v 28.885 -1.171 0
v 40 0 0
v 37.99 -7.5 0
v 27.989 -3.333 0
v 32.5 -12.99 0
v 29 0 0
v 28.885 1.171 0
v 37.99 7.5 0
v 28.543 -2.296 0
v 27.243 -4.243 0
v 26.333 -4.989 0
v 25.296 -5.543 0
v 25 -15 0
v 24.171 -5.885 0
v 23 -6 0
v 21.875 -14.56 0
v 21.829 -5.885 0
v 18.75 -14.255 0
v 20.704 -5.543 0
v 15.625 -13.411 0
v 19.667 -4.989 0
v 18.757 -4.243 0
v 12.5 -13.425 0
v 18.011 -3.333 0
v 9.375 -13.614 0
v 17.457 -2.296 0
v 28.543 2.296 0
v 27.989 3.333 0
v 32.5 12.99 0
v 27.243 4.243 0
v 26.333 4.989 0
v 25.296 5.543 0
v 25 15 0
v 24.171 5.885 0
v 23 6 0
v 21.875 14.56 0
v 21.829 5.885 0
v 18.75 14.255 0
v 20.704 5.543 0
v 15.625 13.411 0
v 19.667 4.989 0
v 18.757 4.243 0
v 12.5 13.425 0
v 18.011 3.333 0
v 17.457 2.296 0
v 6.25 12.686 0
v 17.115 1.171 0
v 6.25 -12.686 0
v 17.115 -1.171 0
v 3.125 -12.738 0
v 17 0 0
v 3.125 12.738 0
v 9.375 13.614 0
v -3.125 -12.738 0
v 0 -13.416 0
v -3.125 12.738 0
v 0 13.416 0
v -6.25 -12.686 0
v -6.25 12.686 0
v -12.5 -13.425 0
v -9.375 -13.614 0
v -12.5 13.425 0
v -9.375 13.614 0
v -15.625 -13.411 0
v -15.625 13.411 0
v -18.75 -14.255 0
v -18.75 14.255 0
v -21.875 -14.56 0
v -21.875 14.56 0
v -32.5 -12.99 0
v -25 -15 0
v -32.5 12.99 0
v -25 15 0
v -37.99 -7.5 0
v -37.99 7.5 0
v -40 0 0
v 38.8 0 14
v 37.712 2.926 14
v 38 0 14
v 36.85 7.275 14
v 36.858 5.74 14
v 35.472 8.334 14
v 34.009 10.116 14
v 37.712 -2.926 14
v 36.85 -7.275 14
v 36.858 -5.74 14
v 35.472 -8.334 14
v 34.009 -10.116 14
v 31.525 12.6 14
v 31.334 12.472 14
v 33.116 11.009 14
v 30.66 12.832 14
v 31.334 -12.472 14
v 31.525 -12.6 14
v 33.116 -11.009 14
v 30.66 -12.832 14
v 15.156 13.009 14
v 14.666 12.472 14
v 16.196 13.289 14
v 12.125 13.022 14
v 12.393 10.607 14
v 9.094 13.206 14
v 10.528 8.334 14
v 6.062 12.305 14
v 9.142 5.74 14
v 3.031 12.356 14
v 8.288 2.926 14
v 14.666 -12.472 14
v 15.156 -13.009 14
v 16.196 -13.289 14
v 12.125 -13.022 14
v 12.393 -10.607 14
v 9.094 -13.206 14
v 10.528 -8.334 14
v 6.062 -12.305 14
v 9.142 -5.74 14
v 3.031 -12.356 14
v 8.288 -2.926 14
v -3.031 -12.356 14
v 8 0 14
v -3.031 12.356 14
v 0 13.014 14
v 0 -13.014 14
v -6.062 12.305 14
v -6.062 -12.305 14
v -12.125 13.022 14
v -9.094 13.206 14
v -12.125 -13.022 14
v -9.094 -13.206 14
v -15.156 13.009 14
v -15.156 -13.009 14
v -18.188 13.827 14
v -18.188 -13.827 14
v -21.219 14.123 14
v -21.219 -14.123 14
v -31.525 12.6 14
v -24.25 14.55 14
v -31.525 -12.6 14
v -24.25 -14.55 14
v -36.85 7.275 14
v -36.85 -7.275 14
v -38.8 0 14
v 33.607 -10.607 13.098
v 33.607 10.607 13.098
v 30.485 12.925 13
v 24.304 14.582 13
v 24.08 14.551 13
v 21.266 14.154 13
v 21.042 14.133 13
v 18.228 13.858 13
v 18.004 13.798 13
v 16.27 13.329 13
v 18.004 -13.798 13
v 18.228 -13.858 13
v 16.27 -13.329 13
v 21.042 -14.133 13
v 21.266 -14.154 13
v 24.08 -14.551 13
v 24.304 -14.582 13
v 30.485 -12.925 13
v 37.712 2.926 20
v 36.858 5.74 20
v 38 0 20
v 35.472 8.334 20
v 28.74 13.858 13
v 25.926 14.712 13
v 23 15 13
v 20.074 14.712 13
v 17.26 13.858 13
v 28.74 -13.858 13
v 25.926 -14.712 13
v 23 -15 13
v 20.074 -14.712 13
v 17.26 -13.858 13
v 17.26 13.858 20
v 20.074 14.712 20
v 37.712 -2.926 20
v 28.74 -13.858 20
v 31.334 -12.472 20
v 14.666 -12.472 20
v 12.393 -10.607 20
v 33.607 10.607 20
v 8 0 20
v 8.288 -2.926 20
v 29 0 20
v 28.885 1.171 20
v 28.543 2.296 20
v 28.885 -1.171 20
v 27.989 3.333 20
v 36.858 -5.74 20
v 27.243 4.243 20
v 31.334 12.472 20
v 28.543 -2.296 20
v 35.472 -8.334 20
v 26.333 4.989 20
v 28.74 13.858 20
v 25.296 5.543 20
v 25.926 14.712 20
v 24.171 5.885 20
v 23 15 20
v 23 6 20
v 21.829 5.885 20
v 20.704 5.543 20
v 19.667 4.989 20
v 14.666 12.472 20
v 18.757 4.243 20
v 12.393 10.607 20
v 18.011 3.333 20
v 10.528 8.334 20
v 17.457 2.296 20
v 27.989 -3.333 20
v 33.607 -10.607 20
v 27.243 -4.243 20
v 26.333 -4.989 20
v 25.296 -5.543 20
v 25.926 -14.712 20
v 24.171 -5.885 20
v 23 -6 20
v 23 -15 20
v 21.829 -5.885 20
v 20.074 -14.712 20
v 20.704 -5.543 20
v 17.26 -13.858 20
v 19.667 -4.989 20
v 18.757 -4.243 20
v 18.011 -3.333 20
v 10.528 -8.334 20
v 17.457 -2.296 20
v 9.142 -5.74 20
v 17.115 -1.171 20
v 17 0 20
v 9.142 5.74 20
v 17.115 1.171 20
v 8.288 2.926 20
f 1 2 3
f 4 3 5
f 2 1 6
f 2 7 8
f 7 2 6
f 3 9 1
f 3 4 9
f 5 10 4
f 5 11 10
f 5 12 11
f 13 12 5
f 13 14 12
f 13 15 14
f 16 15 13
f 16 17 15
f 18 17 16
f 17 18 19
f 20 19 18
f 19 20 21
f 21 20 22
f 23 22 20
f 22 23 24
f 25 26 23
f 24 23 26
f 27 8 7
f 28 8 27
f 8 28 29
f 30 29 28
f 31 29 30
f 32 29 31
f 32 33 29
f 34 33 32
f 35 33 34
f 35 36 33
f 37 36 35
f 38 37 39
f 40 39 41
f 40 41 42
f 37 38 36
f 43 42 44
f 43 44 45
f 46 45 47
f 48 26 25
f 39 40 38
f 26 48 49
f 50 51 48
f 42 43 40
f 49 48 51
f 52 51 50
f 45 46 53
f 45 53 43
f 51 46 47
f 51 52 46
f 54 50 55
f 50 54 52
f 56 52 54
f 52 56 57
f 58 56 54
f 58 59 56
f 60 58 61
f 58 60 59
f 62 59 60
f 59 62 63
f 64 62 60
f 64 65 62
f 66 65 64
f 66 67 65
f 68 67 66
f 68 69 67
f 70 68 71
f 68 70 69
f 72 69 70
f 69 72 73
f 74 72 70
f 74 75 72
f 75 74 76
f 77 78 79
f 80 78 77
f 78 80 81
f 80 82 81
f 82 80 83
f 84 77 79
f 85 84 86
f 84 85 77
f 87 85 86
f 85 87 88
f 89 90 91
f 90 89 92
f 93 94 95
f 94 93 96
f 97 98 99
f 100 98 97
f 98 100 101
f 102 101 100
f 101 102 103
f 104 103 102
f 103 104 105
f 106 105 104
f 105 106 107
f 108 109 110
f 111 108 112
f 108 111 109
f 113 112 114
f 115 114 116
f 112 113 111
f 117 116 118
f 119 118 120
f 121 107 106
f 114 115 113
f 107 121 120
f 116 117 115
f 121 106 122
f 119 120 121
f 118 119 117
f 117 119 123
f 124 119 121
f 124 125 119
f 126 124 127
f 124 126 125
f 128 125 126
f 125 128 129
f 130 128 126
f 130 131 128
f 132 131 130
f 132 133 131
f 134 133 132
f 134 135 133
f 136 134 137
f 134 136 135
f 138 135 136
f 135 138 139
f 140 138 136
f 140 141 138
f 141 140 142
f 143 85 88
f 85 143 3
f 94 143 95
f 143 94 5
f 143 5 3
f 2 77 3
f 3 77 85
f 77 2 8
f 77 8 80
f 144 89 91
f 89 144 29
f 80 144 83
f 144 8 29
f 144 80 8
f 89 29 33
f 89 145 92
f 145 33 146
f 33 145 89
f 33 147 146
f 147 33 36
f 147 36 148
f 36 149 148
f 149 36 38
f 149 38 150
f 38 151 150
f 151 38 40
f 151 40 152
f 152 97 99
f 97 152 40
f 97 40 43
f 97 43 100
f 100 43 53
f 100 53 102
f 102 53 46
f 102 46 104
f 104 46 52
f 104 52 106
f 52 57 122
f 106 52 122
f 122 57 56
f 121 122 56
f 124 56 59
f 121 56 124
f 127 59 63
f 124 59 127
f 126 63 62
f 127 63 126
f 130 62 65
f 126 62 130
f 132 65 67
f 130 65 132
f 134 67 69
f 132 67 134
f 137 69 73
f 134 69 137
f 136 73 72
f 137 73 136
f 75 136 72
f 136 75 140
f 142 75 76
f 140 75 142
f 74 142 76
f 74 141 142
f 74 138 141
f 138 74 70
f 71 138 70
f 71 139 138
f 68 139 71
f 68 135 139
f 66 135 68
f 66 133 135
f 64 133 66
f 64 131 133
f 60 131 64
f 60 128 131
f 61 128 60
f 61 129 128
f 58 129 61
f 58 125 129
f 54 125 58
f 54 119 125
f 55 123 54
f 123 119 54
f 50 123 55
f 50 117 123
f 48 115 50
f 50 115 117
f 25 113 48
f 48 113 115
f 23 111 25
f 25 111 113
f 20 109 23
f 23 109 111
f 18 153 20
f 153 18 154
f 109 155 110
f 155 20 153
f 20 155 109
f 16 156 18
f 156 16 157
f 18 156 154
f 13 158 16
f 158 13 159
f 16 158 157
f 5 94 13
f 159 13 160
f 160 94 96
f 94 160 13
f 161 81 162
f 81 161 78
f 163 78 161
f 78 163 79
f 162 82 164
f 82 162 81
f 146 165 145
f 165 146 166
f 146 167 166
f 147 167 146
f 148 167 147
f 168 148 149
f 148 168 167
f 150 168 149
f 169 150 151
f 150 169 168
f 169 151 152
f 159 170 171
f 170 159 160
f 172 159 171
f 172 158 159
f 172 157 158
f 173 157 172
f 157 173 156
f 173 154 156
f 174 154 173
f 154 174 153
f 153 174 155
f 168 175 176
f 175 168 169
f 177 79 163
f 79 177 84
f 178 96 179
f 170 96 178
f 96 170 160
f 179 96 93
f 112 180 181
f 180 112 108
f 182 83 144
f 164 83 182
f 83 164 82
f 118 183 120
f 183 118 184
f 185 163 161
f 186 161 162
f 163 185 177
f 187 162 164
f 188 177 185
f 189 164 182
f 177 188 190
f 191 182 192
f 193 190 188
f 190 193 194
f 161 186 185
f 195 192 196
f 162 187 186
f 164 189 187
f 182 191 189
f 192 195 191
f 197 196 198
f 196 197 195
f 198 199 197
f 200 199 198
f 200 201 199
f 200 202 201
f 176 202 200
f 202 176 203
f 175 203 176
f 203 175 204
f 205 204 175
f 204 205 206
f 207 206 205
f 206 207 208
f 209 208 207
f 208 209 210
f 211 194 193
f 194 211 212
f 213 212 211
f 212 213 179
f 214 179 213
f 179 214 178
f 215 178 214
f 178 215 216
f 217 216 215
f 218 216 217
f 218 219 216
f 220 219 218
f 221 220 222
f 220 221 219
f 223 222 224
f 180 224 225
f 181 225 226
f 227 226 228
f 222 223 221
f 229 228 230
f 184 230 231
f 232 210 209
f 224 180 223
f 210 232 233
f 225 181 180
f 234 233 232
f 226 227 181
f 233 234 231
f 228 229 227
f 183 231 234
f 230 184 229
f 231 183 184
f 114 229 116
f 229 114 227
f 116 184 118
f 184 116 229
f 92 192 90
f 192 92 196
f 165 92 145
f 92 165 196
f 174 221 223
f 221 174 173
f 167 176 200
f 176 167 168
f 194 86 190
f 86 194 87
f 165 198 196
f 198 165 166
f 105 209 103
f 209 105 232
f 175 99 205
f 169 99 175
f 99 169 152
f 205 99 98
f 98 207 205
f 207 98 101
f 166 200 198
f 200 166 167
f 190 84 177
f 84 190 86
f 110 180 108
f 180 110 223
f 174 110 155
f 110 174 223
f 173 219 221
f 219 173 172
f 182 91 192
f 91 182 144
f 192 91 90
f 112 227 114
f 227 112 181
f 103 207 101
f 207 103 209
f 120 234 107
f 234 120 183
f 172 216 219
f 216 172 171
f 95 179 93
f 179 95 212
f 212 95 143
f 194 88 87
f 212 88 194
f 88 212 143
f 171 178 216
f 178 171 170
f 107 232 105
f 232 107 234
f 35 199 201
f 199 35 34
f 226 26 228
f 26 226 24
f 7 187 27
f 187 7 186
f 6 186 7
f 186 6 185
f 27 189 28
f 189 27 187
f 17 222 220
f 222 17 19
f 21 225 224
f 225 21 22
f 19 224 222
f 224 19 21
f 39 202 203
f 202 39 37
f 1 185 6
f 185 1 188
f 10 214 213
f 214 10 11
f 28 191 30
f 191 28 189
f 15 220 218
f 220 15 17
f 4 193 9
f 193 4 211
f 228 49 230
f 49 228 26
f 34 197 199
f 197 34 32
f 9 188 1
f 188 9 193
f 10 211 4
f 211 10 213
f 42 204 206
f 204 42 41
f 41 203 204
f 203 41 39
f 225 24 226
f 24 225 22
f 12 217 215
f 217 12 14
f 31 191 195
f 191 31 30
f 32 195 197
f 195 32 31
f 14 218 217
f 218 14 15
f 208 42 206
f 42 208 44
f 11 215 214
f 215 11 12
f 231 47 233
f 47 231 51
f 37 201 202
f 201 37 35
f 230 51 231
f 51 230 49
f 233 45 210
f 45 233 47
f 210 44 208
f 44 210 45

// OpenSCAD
$fn = 32;

// ----------------------------------------------------------------------
// Handle: 80 x 30 mm grip, 14 mm thick
// ----------------------------------------------------------------------

// --- parameters (mm) ---
length = 80;              // grip length
width = 30;               // grip width
thickness = 14;           // grip thickness
waist = 0.86;             // width factor at the middle
draft = 0.97;             // top face scale of the extrusion
scallops = 5;             // finger rests per side
ripple = 0.04;            // depth factor of the finger rests
boss_d = 30;              // mounting boss diameter
boss_h = 6;               // mounting boss height
boss_hole_d = 12;         // screw clearance through the boss
boss_r = 23;              // boss centre from the grip centre

/* ergonomic grip outline, closed spline-like polygon in the XY plane */
grip = [[-25, 15], [-21.875, 14.56], [-18.75, 14.255], [-15.625, 13.411], [-12.5, 13.425], [-9.375, 13.614], [-6.25, 12.686], [-3.125, 12.738], [0, 13.416], [3.125, 12.738], [6.25, 12.686], [9.375, 13.614], [12.5, 13.425], [15.625, 13.411], [18.75, 14.255], [21.875, 14.56], [25, 15], [32.5, 12.99], [37.99, 7.5], [40, 0], [37.99, -7.5], [32.5, -12.99], [25, -15], [25, -15], [21.875, -14.56], [18.75, -14.255], [15.625, -13.411], [12.5, -13.425], [9.375, -13.614], [6.25, -12.686], [3.125, -12.738], [0, -13.416], [-3.125, -12.738], [-6.25, -12.686], [-9.375, -13.614], [-12.5, -13.425], [-15.625, -13.411], [-18.75, -14.255], [-21.875, -14.56], [-25, -15], [-32.5, -12.99], [-37.99, -7.5], [-40, 0], [-37.99, 7.5], [-32.5, 12.99], [-25, 15]];

module grip_body() {
  linear_extrude(height = thickness, scale = draft) polygon(grip);
}

module boss_body() {
  /* sunk 1 mm into the grip so the joint overlaps */
  translate([boss_r, 0, thickness - 1]) cylinder(h = boss_h + 1, d = boss_d);
}

difference() {
  union() {
    grip_body();
    boss_body();
  }
  translate([boss_r, 0, -1]) cylinder(h = thickness + boss_h + 2, d = boss_hole_d);
}
